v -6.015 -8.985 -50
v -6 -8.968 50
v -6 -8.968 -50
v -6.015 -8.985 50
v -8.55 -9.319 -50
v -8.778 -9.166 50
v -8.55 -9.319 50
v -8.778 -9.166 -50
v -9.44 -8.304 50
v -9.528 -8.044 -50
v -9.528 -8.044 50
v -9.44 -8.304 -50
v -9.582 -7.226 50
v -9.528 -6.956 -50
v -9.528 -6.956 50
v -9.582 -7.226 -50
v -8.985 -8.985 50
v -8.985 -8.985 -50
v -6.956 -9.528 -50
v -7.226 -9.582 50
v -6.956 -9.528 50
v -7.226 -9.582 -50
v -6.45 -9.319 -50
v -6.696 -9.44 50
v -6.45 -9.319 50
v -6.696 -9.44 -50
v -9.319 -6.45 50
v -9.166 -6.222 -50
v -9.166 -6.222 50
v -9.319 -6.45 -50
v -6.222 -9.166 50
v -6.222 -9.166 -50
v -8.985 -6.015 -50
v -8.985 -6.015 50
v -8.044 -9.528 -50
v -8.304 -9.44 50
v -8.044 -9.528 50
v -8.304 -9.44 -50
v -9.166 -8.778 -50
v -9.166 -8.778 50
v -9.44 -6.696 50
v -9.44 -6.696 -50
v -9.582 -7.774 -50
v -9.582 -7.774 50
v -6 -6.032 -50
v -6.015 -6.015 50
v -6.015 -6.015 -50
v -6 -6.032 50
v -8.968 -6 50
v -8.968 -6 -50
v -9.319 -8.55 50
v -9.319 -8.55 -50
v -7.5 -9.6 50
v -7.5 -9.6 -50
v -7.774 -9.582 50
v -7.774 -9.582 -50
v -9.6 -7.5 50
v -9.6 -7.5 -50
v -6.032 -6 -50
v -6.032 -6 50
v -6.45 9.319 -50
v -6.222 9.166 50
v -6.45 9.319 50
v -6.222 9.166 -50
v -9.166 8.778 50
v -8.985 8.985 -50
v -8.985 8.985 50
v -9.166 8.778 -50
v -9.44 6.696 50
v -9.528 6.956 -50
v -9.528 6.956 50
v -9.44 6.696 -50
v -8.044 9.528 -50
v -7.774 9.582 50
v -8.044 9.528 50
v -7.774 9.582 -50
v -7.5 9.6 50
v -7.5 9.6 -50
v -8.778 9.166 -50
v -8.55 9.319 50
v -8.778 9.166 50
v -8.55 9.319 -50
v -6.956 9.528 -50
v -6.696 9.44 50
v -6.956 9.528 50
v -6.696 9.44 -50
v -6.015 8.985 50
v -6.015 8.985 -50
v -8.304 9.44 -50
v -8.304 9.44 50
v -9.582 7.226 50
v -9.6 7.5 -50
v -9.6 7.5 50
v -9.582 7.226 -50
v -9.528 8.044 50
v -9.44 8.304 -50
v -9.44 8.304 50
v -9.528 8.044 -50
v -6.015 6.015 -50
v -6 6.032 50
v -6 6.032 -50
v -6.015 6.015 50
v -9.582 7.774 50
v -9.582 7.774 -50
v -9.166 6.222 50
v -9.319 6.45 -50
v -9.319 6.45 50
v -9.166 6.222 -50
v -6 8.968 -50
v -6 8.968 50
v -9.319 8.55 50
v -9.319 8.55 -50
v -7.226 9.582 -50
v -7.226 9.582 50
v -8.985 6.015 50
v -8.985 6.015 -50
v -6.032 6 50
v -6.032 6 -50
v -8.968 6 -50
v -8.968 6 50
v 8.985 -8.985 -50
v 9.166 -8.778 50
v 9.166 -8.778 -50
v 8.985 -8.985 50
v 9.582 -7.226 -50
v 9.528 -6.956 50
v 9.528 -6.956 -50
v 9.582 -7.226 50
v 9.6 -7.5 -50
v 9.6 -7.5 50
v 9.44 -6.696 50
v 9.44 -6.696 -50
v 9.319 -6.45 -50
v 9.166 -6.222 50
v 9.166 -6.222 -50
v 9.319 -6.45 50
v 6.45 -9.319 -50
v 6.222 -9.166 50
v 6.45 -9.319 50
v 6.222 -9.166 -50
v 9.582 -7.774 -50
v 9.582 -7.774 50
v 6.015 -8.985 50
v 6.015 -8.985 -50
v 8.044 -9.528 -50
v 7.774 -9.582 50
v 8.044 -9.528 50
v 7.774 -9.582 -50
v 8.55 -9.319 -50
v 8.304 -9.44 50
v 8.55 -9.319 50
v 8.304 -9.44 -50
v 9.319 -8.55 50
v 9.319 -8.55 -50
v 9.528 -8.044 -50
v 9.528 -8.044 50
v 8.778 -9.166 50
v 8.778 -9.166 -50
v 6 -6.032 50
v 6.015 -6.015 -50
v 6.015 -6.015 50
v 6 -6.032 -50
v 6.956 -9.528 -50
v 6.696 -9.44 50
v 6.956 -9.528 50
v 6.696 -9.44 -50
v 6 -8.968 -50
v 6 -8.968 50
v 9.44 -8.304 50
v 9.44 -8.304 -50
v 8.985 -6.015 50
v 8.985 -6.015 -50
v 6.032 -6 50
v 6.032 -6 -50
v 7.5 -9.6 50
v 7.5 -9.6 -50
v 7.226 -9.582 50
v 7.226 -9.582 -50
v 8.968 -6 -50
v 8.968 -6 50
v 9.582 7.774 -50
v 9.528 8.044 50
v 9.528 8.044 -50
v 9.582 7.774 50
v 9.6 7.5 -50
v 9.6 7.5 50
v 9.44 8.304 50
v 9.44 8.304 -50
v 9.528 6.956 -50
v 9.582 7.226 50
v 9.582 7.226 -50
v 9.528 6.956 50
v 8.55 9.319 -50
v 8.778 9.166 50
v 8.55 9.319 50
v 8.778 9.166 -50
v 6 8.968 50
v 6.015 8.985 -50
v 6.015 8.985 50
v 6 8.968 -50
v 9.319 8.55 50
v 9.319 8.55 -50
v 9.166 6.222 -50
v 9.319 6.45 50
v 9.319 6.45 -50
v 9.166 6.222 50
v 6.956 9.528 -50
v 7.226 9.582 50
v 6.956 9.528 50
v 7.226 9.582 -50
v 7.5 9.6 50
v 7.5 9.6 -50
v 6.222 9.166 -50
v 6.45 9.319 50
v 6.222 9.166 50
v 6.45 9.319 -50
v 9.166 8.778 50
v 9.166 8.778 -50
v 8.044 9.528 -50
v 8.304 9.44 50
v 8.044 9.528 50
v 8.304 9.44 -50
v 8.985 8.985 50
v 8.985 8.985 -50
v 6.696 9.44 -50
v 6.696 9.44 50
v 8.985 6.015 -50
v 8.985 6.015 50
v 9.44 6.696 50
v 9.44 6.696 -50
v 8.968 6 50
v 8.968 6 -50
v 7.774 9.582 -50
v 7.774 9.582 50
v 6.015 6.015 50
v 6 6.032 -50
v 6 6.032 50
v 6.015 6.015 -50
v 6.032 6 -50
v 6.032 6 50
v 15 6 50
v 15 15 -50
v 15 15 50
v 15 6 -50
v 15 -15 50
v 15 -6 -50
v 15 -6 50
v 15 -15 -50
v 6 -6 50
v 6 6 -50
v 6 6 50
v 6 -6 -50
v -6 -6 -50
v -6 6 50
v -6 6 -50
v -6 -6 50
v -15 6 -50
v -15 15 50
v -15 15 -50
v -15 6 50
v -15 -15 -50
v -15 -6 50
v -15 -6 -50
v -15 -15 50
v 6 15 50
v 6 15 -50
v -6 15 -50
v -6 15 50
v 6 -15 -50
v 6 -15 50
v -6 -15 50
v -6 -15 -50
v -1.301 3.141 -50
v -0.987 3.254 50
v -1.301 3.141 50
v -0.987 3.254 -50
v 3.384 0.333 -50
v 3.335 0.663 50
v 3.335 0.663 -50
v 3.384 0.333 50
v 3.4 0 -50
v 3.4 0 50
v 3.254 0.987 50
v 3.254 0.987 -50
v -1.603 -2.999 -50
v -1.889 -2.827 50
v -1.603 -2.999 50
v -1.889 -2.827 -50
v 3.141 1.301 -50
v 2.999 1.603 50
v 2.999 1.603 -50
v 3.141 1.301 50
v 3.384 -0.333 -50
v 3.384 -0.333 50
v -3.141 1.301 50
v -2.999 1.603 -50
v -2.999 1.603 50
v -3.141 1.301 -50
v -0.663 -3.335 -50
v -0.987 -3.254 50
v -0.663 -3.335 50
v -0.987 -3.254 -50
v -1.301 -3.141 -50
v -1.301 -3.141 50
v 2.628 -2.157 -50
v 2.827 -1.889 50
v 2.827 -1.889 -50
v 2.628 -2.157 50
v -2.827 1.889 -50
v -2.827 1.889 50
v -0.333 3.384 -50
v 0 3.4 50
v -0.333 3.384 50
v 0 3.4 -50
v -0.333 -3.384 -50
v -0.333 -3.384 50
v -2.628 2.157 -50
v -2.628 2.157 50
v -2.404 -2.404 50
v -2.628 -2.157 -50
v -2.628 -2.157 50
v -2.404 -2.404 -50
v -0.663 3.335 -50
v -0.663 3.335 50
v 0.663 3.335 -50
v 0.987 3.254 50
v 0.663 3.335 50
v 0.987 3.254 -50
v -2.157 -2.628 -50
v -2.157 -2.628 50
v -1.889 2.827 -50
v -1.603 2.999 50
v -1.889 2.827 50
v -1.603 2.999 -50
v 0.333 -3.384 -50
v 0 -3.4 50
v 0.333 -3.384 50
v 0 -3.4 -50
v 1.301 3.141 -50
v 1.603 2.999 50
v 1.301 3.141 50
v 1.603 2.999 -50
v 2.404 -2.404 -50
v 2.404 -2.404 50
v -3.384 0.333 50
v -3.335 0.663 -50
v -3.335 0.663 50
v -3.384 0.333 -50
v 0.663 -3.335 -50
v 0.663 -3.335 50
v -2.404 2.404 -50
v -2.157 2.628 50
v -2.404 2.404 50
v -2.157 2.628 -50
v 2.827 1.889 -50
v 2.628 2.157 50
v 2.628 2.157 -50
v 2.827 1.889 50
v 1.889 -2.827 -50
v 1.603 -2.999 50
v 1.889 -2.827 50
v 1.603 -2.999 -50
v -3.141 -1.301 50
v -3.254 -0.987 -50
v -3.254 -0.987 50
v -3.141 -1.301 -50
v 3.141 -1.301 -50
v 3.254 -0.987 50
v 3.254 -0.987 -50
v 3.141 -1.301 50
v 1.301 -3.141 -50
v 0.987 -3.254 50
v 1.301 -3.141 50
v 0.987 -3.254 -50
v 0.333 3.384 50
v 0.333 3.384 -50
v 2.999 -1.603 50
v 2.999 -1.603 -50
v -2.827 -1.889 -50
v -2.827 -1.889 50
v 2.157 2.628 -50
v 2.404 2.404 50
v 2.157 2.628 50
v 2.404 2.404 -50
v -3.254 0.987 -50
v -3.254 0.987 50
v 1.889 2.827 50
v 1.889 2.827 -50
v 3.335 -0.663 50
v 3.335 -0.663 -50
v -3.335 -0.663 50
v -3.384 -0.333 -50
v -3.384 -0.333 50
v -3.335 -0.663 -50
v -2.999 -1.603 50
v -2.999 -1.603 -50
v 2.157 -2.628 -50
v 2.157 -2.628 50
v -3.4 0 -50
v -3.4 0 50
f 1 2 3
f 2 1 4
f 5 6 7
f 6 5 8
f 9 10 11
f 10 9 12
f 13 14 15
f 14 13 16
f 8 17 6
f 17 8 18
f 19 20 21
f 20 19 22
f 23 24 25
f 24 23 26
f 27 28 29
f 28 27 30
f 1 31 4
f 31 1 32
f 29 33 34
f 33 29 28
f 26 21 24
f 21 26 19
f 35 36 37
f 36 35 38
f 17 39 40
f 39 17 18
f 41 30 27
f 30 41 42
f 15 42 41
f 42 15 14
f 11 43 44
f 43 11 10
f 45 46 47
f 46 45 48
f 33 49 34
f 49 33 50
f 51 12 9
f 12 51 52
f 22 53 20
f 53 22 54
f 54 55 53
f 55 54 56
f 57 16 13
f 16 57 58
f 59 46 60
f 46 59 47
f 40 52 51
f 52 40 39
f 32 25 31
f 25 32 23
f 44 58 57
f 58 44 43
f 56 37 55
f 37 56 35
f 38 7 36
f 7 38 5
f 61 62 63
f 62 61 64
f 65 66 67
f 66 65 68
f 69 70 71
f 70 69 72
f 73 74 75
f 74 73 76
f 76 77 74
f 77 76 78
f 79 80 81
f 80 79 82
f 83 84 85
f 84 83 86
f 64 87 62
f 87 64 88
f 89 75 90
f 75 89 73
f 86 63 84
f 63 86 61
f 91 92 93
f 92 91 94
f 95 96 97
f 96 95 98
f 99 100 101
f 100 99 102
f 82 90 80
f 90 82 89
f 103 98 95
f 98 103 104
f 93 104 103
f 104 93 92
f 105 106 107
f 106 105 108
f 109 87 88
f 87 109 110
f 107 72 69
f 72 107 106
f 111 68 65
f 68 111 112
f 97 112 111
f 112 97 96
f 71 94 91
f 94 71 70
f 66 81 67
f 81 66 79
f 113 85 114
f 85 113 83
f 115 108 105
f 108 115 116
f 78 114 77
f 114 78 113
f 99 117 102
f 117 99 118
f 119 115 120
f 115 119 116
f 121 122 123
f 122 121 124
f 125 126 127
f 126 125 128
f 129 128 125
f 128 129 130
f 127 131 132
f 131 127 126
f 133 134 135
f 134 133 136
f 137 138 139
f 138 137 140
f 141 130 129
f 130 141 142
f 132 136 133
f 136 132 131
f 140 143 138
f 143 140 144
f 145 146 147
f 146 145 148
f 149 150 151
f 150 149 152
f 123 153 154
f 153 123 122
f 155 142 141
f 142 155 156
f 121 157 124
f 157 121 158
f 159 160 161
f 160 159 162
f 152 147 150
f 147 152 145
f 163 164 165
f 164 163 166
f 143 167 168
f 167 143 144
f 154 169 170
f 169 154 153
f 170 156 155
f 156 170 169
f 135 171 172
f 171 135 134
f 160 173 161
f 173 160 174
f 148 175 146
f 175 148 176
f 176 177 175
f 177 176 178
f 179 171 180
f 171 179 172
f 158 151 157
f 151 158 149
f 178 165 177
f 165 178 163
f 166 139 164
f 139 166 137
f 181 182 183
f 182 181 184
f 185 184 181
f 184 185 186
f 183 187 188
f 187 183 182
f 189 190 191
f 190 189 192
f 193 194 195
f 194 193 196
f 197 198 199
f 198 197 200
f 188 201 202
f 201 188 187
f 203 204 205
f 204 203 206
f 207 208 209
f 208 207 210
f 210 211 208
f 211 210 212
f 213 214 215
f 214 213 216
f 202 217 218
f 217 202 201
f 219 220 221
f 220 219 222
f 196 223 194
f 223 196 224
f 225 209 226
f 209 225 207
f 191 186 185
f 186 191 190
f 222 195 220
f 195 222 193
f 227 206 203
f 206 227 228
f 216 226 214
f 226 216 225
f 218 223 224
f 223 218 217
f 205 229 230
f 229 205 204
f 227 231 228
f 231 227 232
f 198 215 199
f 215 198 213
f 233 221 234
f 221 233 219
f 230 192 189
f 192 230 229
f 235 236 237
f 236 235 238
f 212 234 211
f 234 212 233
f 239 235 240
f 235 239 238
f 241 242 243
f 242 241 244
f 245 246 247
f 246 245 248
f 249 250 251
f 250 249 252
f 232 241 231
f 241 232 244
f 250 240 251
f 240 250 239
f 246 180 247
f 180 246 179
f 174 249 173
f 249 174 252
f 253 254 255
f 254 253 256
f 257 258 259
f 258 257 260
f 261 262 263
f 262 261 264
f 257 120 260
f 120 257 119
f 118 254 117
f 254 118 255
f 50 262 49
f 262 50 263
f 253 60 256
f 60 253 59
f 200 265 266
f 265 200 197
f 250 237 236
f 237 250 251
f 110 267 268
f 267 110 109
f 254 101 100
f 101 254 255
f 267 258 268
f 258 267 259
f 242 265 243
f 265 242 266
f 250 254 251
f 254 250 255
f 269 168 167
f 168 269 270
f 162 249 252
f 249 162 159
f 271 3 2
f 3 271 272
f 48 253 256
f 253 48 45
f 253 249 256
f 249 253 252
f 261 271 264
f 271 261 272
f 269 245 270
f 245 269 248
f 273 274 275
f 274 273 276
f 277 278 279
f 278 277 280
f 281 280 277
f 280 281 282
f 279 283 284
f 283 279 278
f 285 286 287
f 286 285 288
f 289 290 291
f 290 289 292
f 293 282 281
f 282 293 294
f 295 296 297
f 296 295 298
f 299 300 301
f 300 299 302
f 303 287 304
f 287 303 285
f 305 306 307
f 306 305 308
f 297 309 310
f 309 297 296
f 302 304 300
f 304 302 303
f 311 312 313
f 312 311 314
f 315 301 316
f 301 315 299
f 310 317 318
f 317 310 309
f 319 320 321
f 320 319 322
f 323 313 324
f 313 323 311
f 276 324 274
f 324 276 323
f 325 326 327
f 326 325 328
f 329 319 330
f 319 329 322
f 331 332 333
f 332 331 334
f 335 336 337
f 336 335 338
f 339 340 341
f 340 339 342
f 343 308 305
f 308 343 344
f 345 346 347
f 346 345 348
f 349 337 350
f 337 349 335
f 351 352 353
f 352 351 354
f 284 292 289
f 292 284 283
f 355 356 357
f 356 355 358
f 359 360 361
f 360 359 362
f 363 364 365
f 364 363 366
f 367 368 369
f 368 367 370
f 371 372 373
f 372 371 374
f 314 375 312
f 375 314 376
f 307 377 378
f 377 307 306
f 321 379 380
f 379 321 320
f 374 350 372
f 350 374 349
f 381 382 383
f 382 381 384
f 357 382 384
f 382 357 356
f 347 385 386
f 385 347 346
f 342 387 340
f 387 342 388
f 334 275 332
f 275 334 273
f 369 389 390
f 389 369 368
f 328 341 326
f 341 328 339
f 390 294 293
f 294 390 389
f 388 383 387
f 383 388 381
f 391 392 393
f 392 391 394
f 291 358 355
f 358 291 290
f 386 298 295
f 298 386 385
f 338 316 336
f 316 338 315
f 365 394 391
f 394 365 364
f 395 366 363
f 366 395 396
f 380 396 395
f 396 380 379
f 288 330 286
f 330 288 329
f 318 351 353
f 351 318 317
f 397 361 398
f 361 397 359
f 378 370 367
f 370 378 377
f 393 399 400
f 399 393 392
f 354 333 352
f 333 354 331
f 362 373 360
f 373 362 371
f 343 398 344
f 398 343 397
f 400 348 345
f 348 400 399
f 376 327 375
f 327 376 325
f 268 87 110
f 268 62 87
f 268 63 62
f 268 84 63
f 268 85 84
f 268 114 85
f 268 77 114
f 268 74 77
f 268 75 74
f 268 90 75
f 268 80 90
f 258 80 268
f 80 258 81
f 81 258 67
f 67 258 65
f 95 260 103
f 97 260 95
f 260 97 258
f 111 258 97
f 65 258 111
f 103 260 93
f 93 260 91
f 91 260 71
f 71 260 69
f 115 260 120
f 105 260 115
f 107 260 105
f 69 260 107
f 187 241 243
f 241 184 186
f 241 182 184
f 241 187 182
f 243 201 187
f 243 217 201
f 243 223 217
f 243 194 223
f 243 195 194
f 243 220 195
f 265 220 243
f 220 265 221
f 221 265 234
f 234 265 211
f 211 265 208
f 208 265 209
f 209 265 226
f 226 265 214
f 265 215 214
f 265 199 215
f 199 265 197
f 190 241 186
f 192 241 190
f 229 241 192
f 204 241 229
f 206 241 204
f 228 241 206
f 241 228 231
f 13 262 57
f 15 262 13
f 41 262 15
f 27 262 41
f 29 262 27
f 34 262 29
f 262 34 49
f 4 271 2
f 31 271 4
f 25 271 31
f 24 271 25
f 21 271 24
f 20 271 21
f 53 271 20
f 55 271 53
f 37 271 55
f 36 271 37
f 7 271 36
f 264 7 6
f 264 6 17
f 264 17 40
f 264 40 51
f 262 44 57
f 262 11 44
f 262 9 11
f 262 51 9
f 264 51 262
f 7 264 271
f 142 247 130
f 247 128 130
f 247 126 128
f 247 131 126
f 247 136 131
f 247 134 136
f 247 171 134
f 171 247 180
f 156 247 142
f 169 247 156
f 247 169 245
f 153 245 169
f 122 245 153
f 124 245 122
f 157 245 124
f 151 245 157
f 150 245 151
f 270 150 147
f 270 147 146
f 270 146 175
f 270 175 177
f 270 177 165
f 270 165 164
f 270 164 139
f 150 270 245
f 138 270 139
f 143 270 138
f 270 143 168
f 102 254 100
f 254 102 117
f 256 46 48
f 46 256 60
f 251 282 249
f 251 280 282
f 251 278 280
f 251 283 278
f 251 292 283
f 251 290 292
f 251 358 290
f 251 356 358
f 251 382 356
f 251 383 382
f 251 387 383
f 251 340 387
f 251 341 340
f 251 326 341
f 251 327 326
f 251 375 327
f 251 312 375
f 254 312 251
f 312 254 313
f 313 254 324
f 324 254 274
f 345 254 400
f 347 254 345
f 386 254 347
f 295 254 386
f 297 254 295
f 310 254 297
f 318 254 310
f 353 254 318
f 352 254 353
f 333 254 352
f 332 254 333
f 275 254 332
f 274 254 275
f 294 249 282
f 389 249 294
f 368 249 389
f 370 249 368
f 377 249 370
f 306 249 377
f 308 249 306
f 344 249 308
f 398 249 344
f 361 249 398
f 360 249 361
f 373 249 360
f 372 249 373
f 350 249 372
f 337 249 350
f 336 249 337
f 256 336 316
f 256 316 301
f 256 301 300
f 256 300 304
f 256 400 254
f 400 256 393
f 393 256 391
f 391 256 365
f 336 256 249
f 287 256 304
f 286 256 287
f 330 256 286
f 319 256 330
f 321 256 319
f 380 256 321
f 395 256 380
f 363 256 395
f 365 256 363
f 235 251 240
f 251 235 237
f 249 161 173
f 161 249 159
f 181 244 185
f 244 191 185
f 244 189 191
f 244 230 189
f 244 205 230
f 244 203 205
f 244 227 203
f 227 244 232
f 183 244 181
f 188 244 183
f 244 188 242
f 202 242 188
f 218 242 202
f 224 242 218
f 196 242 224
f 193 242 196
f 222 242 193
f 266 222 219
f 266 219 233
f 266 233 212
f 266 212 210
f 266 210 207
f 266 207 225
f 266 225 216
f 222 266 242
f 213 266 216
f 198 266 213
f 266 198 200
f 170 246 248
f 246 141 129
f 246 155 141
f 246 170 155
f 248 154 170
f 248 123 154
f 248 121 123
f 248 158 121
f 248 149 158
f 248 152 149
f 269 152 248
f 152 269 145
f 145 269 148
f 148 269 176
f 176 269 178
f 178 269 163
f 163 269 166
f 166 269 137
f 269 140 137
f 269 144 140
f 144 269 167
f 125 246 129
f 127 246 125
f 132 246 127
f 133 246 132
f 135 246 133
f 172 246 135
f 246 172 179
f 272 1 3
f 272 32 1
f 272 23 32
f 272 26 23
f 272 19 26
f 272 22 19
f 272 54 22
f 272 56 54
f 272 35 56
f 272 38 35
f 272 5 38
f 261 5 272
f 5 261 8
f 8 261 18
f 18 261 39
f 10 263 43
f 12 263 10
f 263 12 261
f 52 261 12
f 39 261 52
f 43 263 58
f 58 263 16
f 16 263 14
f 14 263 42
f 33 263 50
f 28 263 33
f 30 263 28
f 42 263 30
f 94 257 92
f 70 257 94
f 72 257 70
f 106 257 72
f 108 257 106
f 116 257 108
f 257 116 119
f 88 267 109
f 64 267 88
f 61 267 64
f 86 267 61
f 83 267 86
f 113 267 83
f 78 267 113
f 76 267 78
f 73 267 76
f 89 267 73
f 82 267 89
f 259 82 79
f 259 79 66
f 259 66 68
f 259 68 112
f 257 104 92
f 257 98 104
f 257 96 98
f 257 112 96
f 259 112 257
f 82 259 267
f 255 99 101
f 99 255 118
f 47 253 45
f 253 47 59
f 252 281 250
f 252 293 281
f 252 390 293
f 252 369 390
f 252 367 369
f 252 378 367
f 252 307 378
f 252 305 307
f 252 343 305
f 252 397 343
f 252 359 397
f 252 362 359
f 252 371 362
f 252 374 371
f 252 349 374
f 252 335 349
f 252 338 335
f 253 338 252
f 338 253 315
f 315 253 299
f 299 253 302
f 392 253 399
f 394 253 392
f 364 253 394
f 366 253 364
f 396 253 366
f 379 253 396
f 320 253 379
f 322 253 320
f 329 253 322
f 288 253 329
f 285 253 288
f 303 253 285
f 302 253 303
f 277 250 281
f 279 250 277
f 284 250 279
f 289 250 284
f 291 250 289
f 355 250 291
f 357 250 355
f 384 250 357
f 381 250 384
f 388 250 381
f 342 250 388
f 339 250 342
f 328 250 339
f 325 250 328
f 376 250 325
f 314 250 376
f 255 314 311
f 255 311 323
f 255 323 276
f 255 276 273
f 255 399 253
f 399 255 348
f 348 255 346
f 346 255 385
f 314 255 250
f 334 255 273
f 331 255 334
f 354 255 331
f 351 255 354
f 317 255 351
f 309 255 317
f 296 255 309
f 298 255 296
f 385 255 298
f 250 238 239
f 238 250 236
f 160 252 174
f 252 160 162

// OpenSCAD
// Aluminium extrusion profile: 30mm x 30mm cross section, 100mm long
// Single connected solid (one part). No extra floating "view" helpers.

// Parameters
cross_section_width_mm  = 30.0;
cross_section_height_mm = 30.0;
length_mm              = 100.0;

cornerHole = 1; // [0:1:1]

// Feature parameters (kept from original, but applied only to the single extrusion)
t_slot_opening_width_mm   = 6.2;
t_slot_inner_width_mm     = 12.0;
t_slot_depth_mm           = 8.0;
t_slot_lip_thickness_mm   = 2.0;

center_bore_diameter_mm   = 6.8;

corner_hole_diameter_mm           = 4.2;
corner_hole_offset_from_edge_mm   = 7.5;

overlap_mm = 1.0;

// Single extrusion module
module extrusion_3030(L=length_mm, W=cross_section_width_mm, H=cross_section_height_mm) {
  color("Silver")
  difference() {
    // Outer body: 30x30 cross-section, 100mm long along Z
    cube([W, H, L], center=true);

    // Subtractive features (all extend through full length)
    union() {
      // T-slots on all four sides (subtractive)
      // +X
      translate([ W/2 - (t_slot_depth_mm + overlap_mm)/2, 0, 0])
        cube([t_slot_depth_mm + overlap_mm, t_slot_inner_width_mm, L + 2*overlap_mm], center=true);
      translate([ W/2 - (t_slot_lip_thickness_mm + overlap_mm)/2, 0, 0])
        cube([t_slot_lip_thickness_mm + overlap_mm, t_slot_opening_width_mm, L + 2*overlap_mm], center=true);

      // -X
      translate([-W/2 + (t_slot_depth_mm + overlap_mm)/2, 0, 0])
        cube([t_slot_depth_mm + overlap_mm, t_slot_inner_width_mm, L + 2*overlap_mm], center=true);
      translate([-W/2 + (t_slot_lip_thickness_mm + overlap_mm)/2, 0, 0])
        cube([t_slot_lip_thickness_mm + overlap_mm, t_slot_opening_width_mm, L + 2*overlap_mm], center=true);

      // +Y
      translate([0, H/2 - (t_slot_depth_mm + overlap_mm)/2, 0])
        cube([t_slot_inner_width_mm, t_slot_depth_mm + overlap_mm, L + 2*overlap_mm], center=true);
      translate([0, H/2 - (t_slot_lip_thickness_mm + overlap_mm)/2, 0])
        cube([t_slot_opening_width_mm, t_slot_lip_thickness_mm + overlap_mm, L + 2*overlap_mm], center=true);

      // -Y
      translate([0, -H/2 + (t_slot_depth_mm + overlap_mm)/2, 0])
        cube([t_slot_inner_width_mm, t_slot_depth_mm + overlap_mm, L + 2*overlap_mm], center=true);
      translate([0, -H/2 + (t_slot_lip_thickness_mm + overlap_mm)/2, 0])
        cube([t_slot_opening_width_mm, t_slot_lip_thickness_mm + overlap_mm, L + 2*overlap_mm], center=true);

      // Center bore
      cylinder(d=center_bore_diameter_mm, h=L + 2*overlap_mm, center=true, $fn=64);

      // Corner holes
      if (cornerHole) {
        for (sx = [-1, 1], sy = [-1, 1]) {
          translate([sx*(W/2 - corner_hole_offset_from_edge_mm),
                     sy*(H/2 - corner_hole_offset_from_edge_mm),
                     0])
            cylinder(d=corner_hole_diameter_mm, h=L + 2*overlap_mm, center=true, $fn=48);
        }
      }
    }
  }
}

// Build single connected solid
extrusion_3030();
